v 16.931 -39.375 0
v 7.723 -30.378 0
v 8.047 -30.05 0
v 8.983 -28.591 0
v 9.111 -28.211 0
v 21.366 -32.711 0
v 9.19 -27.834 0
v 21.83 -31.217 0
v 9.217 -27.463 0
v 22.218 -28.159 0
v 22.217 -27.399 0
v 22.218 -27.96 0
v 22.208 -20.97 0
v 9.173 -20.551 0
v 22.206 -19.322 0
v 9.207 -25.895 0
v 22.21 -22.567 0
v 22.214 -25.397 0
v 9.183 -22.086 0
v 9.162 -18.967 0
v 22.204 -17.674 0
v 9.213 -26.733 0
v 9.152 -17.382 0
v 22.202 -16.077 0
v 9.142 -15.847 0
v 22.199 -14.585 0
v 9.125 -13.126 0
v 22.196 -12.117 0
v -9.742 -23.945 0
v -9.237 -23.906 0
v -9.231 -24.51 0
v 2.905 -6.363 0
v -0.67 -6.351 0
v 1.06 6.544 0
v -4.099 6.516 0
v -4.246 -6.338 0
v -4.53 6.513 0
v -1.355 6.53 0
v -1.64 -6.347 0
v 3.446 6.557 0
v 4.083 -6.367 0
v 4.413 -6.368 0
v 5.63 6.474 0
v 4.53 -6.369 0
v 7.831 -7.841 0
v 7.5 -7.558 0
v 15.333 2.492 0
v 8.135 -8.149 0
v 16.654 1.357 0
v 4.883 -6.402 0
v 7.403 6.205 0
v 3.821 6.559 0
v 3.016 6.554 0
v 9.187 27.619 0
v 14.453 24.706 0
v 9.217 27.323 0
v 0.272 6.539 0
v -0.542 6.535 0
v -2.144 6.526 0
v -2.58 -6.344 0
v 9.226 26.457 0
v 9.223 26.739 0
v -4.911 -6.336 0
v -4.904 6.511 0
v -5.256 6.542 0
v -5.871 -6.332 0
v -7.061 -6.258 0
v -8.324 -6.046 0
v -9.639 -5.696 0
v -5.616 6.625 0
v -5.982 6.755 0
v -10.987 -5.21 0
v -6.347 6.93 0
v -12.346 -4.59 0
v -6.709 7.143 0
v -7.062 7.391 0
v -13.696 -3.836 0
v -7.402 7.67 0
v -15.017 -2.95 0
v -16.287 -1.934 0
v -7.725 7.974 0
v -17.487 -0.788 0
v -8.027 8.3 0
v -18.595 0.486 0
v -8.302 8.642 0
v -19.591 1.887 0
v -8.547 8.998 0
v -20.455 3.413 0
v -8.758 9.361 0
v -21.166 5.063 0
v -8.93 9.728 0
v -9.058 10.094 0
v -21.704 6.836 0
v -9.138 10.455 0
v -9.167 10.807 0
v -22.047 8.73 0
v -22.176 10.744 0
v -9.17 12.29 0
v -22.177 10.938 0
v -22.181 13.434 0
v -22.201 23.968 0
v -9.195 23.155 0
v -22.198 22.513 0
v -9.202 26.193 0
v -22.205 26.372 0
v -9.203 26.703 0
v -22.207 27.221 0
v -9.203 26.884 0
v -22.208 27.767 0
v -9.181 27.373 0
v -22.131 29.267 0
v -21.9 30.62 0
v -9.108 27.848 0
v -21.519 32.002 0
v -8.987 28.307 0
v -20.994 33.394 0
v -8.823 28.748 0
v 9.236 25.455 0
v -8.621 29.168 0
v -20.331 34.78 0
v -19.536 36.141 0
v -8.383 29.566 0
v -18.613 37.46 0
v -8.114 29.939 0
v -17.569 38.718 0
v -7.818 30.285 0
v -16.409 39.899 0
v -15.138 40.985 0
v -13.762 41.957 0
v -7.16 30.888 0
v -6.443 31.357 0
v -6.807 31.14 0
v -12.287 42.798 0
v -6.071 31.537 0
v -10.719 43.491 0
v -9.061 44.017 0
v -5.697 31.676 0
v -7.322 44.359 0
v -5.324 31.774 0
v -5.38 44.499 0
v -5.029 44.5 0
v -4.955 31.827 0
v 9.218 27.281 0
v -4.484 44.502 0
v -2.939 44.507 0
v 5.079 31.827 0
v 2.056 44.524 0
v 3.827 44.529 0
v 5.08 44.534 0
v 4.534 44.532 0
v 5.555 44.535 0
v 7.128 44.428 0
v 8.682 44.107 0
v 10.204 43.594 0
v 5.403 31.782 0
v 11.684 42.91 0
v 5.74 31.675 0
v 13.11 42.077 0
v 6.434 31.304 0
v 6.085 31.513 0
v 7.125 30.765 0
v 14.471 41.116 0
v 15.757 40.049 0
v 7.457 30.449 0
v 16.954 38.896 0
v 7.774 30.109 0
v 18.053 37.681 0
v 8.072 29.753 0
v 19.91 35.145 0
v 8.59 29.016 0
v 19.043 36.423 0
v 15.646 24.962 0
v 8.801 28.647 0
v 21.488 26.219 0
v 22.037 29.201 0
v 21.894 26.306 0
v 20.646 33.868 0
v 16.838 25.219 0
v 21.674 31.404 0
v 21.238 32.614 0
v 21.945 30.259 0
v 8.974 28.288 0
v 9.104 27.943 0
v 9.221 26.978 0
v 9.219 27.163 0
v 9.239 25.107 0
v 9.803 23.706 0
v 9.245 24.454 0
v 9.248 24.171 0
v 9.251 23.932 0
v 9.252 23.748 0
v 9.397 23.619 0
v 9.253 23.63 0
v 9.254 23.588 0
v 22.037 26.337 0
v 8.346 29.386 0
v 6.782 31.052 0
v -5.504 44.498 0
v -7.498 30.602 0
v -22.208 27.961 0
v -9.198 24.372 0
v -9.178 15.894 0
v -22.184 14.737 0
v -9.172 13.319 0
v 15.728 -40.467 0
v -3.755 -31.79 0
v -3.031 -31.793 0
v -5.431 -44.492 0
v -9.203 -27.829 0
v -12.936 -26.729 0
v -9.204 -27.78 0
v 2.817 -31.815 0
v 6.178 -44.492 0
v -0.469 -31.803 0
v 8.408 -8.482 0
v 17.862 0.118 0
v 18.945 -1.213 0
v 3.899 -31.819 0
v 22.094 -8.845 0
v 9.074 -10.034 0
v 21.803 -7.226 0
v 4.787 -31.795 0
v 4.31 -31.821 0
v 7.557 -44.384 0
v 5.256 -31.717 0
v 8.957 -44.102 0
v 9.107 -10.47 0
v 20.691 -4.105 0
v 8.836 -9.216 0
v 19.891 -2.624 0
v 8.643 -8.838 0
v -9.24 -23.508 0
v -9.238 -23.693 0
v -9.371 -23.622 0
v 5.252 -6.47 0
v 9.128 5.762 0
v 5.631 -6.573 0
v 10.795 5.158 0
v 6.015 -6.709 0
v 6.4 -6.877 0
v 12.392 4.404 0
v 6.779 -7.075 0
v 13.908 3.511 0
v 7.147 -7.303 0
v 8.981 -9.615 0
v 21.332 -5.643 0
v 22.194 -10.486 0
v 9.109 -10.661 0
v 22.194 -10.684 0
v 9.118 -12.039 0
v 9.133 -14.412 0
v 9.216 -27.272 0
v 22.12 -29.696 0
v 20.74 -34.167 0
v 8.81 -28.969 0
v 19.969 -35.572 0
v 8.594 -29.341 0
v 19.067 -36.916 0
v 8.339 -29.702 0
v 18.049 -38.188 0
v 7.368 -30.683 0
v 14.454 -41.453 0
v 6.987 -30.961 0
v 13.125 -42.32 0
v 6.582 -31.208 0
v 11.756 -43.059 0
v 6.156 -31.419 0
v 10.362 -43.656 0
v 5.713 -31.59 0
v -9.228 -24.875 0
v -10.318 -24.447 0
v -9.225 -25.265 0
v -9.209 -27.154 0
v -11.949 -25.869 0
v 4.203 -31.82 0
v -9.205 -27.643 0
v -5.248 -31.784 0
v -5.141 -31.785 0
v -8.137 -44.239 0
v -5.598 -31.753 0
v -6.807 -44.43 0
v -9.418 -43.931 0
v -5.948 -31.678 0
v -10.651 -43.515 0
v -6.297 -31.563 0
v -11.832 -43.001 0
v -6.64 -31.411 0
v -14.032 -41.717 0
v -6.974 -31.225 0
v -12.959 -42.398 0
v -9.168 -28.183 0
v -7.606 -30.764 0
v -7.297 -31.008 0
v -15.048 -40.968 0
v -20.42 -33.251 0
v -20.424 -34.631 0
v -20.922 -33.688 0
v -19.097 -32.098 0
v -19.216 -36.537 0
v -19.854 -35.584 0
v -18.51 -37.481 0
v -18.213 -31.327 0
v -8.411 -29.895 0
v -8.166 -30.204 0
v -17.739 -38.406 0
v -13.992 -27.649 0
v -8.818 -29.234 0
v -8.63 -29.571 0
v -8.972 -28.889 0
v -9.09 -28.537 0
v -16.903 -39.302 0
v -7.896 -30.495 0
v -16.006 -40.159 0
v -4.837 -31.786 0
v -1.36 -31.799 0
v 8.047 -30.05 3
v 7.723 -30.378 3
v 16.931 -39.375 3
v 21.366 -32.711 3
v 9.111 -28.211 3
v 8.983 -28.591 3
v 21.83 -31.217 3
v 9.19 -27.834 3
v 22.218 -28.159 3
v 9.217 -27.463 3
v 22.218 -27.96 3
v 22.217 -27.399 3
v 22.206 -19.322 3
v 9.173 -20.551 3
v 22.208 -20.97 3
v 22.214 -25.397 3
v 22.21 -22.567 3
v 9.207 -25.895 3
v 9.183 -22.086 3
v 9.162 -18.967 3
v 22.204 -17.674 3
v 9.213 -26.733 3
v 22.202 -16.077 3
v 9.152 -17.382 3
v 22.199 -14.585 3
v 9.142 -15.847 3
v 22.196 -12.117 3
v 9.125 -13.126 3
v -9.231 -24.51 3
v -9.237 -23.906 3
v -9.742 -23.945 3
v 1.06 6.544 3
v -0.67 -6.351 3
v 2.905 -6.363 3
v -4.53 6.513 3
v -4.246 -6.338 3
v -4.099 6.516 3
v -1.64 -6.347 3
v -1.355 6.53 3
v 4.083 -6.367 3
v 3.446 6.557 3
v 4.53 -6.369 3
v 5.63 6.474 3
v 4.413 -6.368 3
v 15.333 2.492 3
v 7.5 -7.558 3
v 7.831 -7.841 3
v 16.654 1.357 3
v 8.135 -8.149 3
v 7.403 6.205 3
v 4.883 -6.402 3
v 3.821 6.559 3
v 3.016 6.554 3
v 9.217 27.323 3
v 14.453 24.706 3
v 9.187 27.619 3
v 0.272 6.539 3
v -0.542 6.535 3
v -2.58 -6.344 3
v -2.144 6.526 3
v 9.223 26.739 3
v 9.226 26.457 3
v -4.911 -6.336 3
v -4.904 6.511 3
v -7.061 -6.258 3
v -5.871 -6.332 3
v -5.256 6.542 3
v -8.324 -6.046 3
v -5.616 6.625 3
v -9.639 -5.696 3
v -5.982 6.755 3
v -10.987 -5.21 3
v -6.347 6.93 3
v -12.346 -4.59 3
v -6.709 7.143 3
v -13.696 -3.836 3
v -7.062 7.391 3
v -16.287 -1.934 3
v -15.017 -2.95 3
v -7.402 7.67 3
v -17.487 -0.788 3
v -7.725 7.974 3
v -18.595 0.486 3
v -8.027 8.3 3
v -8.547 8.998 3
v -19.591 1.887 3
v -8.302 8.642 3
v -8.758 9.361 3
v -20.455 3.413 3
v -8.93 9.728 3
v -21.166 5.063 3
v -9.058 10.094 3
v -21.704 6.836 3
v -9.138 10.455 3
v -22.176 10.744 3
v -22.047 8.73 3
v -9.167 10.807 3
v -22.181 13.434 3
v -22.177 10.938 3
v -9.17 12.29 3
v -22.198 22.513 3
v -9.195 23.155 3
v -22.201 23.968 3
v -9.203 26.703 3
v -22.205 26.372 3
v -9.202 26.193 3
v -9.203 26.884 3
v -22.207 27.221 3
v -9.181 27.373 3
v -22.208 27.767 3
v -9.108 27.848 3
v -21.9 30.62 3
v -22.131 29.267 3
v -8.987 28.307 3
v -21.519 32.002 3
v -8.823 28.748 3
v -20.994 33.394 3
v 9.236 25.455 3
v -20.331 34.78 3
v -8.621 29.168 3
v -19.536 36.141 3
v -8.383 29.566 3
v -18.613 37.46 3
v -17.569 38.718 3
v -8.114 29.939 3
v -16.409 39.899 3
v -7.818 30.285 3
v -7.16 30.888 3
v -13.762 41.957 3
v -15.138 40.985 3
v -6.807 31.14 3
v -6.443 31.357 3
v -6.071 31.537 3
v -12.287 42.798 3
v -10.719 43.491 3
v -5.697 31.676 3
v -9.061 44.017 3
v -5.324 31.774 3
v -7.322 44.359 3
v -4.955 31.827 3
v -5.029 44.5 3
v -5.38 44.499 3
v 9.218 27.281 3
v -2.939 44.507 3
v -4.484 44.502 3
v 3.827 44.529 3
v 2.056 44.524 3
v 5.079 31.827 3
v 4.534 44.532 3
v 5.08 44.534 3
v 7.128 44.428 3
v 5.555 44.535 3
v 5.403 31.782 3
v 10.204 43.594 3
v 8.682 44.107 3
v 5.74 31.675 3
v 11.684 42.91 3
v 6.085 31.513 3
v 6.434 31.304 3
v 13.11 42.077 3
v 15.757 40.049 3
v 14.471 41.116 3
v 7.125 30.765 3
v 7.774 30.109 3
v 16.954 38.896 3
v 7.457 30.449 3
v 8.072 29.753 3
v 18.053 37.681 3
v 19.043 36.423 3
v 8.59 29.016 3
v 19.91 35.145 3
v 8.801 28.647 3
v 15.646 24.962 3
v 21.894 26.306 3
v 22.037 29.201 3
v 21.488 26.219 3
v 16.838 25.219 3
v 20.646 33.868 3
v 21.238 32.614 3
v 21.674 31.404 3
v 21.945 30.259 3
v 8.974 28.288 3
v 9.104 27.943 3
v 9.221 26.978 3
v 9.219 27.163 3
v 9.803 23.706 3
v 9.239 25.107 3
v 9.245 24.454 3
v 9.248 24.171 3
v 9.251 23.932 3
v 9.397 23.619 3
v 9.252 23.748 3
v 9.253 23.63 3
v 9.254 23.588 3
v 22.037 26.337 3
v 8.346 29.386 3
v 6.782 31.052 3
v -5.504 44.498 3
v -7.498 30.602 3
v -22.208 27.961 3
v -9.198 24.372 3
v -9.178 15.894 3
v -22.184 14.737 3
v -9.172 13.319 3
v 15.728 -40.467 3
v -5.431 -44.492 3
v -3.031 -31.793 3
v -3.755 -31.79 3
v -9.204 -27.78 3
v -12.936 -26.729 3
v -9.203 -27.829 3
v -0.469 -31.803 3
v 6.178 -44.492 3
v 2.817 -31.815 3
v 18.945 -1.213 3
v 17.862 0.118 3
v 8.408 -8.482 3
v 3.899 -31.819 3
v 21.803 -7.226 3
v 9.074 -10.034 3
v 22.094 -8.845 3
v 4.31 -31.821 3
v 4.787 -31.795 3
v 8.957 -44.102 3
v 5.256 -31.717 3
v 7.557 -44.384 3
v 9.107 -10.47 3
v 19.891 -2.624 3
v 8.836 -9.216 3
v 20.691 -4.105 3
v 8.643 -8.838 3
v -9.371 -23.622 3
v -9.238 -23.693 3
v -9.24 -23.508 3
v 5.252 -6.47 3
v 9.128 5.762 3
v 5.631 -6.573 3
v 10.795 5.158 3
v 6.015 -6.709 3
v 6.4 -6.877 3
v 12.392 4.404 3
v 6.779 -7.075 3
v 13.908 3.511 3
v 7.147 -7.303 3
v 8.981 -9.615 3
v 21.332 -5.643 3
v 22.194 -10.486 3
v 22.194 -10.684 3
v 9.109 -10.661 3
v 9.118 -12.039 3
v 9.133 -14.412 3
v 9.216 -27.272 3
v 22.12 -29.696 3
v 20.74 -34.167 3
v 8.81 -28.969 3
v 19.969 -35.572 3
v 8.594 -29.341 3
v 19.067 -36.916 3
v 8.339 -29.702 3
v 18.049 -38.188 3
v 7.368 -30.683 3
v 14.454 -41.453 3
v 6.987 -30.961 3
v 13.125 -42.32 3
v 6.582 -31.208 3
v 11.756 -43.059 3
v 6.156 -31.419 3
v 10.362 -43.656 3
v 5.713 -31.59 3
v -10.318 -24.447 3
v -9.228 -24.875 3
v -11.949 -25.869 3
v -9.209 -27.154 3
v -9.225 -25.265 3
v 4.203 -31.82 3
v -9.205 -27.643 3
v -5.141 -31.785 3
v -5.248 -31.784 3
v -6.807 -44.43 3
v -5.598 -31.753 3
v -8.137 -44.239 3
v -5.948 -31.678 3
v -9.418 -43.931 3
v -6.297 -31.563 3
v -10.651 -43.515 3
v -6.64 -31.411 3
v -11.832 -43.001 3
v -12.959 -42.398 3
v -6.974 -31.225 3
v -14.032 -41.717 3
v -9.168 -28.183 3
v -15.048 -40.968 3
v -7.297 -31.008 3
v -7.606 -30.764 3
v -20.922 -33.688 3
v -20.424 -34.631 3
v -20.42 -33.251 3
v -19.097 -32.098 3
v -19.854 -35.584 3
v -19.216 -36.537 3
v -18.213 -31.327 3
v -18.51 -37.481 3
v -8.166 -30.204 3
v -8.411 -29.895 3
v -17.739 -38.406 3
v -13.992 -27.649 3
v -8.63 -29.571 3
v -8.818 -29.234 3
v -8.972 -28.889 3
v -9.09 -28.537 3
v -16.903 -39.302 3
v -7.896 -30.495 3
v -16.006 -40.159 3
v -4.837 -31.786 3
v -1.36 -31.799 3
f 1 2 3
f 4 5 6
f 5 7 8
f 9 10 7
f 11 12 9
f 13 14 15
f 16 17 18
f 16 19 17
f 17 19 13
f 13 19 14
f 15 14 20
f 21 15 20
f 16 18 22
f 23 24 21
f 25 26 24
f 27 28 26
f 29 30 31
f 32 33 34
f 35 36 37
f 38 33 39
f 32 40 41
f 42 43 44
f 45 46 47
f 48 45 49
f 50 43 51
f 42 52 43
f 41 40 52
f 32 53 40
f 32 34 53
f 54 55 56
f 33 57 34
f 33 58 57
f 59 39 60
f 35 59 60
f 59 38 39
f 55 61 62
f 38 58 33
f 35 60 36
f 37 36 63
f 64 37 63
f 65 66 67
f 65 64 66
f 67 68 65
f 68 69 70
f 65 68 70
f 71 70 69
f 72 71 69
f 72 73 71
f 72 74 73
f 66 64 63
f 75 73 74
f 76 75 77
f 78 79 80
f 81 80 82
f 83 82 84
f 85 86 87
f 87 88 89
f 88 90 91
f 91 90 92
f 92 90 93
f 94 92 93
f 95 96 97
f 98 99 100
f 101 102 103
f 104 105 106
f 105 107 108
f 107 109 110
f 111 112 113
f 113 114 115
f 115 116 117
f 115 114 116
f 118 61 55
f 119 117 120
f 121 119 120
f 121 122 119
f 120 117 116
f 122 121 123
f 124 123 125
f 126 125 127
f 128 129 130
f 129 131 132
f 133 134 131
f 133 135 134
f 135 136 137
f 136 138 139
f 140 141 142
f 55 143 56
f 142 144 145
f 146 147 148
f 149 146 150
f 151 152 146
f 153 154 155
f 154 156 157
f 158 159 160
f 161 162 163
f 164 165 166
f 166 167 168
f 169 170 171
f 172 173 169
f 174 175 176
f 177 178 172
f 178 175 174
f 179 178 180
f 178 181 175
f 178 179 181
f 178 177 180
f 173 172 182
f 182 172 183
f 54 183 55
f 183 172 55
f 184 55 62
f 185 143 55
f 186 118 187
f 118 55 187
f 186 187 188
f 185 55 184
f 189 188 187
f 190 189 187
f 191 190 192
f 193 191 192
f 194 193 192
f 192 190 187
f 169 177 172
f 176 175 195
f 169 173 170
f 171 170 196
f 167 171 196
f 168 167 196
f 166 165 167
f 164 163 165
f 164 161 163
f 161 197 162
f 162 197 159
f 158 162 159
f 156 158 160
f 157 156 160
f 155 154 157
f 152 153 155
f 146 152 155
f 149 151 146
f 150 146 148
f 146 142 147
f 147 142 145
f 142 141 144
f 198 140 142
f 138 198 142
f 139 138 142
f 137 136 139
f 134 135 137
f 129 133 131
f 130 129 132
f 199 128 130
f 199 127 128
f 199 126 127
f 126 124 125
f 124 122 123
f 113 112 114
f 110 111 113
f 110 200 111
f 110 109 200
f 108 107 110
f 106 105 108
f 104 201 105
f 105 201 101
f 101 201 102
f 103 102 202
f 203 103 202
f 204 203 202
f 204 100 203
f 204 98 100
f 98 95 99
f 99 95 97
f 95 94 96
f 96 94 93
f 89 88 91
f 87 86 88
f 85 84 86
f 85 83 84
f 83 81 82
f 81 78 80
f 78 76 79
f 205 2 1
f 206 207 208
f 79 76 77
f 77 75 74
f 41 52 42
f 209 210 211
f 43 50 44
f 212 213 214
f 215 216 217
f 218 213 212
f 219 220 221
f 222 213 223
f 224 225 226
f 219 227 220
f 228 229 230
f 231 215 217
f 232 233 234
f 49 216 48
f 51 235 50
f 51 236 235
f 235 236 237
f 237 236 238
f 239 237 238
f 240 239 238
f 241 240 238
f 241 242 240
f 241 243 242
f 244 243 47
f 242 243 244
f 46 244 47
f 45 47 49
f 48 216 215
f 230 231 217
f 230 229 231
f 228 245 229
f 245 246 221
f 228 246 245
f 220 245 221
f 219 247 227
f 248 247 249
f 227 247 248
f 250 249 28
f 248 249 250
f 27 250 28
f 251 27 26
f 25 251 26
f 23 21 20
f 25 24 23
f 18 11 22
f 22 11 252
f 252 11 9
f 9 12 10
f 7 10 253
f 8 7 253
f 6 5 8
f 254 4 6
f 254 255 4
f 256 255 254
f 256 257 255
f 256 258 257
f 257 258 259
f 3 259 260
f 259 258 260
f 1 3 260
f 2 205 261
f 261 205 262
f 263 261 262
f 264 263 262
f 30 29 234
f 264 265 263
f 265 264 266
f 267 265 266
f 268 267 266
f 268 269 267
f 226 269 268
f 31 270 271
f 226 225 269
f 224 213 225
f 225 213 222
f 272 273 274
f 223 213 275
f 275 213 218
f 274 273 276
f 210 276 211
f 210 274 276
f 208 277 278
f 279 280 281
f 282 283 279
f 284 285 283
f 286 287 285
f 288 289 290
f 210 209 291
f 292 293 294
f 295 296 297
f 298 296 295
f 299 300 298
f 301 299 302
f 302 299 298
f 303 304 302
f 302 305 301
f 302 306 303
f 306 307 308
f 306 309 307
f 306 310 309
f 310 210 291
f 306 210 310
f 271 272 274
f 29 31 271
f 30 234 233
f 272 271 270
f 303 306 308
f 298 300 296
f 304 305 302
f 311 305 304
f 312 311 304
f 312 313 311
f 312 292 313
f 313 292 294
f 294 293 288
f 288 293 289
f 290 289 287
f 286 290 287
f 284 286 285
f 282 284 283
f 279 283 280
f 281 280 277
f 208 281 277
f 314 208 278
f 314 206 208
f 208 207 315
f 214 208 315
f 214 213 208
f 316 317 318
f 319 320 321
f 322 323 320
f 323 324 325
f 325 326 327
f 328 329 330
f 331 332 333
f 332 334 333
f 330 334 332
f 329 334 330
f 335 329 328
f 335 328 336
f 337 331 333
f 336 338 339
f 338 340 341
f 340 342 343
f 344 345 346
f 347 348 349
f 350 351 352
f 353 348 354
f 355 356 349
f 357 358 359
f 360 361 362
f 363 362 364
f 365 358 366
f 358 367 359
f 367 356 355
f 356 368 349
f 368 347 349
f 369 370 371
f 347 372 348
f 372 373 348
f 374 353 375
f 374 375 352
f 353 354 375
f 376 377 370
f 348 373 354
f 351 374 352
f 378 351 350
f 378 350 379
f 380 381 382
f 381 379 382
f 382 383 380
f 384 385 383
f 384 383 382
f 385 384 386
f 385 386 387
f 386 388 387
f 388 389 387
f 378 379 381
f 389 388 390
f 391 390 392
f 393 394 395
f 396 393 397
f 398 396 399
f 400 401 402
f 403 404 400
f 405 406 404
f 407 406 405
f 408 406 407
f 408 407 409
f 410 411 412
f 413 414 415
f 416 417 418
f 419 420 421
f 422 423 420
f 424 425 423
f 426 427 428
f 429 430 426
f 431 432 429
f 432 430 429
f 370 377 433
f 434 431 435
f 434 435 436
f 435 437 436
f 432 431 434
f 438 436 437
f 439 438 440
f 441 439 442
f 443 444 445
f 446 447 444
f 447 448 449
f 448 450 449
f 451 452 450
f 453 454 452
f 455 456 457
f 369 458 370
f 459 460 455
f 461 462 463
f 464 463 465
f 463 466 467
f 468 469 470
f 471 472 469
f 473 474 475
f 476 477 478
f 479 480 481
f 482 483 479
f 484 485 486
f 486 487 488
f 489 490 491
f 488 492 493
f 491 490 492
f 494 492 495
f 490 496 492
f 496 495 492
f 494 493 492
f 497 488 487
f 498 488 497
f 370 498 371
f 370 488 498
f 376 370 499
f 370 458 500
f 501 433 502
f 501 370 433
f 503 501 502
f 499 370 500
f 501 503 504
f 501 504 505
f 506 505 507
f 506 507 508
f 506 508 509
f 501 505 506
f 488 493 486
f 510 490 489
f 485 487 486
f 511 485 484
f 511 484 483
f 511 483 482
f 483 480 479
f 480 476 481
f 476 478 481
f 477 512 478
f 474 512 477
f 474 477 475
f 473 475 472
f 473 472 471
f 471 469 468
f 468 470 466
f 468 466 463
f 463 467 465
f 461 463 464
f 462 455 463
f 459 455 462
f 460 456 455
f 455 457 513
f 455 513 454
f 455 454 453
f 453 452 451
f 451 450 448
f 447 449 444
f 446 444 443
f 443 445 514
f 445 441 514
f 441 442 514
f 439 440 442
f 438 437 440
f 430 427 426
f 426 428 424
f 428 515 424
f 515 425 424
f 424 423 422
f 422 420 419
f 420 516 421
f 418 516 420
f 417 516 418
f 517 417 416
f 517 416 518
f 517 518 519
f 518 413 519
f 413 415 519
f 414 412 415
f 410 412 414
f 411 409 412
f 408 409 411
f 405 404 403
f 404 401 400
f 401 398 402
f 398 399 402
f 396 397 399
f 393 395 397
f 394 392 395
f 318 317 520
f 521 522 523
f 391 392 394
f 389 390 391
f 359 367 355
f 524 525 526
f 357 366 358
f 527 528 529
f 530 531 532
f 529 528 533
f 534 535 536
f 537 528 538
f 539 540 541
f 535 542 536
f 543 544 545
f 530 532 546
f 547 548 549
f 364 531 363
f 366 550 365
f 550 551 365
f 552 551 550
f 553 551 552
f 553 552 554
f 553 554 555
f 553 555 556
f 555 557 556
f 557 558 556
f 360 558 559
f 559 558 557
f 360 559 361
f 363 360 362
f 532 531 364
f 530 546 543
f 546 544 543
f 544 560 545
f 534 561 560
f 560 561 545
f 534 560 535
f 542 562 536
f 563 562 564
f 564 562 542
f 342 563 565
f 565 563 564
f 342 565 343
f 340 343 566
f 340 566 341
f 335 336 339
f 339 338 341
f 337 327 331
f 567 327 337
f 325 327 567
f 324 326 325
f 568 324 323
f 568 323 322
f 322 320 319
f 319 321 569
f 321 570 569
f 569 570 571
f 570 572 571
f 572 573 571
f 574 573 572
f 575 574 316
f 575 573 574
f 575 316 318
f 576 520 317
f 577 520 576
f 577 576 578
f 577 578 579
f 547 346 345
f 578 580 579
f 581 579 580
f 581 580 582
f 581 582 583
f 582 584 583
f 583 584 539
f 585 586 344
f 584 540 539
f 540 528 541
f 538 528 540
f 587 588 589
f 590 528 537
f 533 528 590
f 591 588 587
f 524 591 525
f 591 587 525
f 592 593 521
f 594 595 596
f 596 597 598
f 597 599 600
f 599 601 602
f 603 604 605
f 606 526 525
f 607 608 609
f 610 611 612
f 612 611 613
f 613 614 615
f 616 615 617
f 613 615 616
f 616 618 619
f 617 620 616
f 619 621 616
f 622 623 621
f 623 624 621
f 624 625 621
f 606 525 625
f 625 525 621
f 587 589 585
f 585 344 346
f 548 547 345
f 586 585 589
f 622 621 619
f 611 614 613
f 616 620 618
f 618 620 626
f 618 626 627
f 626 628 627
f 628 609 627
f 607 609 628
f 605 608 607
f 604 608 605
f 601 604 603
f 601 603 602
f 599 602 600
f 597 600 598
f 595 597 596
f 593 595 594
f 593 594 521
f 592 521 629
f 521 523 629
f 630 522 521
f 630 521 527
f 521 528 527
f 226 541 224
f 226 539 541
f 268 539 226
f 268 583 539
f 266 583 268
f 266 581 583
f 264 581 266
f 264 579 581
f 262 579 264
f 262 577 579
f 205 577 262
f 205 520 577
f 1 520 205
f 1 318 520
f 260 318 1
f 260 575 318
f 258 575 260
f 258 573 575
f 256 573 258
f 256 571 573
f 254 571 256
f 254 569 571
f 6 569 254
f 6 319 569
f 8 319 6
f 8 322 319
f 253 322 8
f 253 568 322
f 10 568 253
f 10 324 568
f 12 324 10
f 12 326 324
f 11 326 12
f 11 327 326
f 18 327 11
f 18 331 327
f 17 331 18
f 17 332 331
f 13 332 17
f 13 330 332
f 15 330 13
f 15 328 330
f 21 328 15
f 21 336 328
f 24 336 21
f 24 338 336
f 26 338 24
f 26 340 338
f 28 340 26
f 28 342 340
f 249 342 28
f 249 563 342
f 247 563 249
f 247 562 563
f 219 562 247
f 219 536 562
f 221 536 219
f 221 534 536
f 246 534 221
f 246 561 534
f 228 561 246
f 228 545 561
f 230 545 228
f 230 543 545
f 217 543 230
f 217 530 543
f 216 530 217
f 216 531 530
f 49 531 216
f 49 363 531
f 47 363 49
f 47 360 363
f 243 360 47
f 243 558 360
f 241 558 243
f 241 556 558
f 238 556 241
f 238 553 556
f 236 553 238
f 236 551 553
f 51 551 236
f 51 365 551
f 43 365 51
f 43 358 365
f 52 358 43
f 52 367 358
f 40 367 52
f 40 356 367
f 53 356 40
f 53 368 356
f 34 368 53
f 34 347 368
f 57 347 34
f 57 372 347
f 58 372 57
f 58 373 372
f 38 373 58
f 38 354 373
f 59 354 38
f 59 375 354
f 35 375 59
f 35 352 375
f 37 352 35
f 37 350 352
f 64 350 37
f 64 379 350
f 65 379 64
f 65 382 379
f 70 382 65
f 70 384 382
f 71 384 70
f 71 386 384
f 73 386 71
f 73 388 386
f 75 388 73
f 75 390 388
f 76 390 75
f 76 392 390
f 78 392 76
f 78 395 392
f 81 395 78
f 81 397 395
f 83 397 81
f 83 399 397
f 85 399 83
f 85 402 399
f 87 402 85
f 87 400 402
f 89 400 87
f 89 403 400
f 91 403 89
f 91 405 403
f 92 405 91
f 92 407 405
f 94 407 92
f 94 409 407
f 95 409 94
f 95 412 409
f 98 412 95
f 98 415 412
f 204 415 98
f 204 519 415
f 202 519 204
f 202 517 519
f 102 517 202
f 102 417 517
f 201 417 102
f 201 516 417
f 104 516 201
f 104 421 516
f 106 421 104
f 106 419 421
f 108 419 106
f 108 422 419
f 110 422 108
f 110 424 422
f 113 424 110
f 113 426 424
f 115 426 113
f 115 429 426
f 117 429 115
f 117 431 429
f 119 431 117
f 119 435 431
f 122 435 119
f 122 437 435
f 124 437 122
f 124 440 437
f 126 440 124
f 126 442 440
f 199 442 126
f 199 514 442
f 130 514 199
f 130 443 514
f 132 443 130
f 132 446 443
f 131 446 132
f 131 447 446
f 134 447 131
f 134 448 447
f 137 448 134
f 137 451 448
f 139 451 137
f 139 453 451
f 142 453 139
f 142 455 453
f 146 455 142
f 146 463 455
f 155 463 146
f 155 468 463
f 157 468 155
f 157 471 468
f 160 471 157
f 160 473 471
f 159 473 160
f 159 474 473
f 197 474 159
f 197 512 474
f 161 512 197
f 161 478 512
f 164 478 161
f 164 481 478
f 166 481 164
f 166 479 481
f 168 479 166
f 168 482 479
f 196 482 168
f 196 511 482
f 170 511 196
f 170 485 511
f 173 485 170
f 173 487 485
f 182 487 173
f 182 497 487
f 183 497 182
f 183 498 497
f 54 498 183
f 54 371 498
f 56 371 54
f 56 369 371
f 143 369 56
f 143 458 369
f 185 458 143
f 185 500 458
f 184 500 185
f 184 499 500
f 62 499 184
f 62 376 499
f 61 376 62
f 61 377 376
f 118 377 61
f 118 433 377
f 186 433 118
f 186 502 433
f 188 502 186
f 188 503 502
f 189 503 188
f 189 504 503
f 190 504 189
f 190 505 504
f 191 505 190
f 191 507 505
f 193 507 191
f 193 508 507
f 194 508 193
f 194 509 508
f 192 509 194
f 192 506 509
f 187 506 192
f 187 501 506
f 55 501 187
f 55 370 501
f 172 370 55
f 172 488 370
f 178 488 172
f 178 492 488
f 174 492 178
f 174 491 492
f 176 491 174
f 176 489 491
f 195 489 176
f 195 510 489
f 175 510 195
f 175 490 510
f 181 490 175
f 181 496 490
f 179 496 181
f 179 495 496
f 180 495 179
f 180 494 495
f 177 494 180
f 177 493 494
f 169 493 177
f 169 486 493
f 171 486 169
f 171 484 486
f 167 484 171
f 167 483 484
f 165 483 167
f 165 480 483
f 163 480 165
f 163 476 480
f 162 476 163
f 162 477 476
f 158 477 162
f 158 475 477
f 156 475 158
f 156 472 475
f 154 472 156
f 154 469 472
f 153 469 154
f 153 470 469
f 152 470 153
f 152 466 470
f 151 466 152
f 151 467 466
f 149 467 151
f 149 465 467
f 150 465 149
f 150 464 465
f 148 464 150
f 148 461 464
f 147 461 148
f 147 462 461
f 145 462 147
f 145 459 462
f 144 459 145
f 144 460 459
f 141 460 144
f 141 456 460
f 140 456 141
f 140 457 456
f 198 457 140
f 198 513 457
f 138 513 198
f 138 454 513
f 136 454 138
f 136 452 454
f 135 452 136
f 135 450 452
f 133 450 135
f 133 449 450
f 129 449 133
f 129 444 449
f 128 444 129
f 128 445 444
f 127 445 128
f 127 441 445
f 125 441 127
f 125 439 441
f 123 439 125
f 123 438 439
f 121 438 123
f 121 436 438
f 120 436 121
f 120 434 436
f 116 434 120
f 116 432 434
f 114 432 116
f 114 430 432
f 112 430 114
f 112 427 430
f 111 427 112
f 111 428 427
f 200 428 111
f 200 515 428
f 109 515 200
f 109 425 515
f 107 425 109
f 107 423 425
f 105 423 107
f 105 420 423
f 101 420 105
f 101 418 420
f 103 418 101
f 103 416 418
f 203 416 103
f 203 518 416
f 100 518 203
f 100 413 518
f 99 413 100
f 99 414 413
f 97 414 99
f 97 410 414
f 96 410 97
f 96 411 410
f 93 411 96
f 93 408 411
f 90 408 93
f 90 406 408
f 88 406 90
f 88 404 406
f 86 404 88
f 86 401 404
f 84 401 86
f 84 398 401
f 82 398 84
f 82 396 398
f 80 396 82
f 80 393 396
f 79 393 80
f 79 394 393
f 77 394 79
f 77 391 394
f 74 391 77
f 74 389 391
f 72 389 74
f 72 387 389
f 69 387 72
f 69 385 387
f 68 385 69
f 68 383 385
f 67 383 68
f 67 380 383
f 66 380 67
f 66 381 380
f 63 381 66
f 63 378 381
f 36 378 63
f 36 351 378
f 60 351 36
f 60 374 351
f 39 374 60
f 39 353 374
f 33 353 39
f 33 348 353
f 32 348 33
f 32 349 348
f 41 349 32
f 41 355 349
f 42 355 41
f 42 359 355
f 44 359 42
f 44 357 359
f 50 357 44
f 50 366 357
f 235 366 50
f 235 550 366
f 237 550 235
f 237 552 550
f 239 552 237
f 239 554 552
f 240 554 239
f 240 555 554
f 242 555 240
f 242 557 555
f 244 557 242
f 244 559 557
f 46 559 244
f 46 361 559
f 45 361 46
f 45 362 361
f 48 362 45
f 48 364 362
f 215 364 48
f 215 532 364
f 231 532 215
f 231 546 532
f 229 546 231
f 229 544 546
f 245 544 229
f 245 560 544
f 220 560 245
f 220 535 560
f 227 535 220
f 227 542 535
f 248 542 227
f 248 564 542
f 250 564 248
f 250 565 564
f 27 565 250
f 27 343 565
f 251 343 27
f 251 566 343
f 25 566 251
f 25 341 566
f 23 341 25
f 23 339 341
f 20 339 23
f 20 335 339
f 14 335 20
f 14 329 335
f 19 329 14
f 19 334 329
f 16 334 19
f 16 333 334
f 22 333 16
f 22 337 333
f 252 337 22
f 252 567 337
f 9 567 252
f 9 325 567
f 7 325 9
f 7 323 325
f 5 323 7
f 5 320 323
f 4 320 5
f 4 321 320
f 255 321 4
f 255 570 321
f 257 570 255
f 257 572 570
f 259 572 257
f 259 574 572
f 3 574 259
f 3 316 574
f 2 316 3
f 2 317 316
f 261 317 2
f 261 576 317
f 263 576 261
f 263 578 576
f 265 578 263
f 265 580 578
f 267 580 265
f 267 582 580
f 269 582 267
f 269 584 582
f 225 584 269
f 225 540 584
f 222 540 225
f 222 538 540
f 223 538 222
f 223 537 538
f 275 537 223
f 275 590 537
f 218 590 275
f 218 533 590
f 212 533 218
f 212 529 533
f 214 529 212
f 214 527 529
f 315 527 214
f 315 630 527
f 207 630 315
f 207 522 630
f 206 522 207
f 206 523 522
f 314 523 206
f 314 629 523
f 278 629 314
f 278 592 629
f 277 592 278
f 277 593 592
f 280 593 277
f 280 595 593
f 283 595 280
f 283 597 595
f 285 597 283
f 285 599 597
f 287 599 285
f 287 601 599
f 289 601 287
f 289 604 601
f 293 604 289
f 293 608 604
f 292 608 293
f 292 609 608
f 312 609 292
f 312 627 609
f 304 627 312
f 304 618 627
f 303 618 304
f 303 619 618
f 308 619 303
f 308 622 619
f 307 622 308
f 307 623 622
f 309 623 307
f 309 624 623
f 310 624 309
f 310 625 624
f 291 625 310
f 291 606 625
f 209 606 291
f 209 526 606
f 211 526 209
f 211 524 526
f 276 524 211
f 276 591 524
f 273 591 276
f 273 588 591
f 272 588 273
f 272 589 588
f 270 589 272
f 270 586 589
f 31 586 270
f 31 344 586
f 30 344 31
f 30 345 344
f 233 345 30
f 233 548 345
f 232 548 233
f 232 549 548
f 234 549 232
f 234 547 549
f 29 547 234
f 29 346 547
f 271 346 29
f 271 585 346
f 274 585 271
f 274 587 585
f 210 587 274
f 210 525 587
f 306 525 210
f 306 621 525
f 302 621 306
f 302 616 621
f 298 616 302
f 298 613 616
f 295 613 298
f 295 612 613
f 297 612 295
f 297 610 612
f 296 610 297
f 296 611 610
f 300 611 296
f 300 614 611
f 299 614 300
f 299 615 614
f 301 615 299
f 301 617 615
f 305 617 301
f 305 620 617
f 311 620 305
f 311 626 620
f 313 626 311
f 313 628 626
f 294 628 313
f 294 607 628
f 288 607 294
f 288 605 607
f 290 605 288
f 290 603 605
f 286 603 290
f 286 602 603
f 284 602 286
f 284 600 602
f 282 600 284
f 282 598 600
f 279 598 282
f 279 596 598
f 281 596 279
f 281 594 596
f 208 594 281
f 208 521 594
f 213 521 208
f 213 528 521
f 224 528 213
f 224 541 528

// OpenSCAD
// Generated from 交通部公路局（原交通部公路總局）「新式號牌使用之英文字、數字字體」author trace
fudge = 0.1;

module glyph_2012_S(h = 3) {
  difference() {
    linear_extrude(height = h)
      polygon(points = [[-5.5045, 44.4985], [-7.3216, 44.3586], [-9.0615, 44.0167], [-10.7186, 43.4907], [-12.2874, 42.7982], [-13.7624, 41.957], [-15.138, 40.9848], [-16.4087, 39.8994], [-17.5689, 38.7185], [-18.6131, 37.4598], [-19.5357, 36.1411], [-20.3313, 34.7801], [-20.9942, 33.3944], [-21.5189, 32.002], [-21.8998, 30.6204], [-22.1315, 29.2674], [-22.2084, 27.9608], [-22.2081, 27.7674], [-22.207, 27.221], [-22.2054, 26.3719], [-22.2034, 25.2707], [-22.201, 23.9677], [-22.1982, 22.5133], [-22.1953, 20.9581], [-22.1923, 19.3525], [-22.1893, 17.7468], [-22.1864, 16.1916], [-22.1837, 14.7373], [-22.1813, 13.4343], [-22.1792, 12.333], [-22.1776, 11.4839], [-22.1766, 10.9375], [-22.1762, 10.7442], [-22.0473, 8.7298], [-21.7038, 6.8356], [-21.1663, 5.0627], [-20.4552, 3.4126], [-19.5913, 1.8866], [-18.5949, 0.486], [-17.4867, -0.7879], [-16.2871, -1.9338], [-15.0169, -2.9503], [-13.6965, -3.8362], [-12.3464, -4.5899], [-10.9872, -5.2104], [-9.6395, -5.6962], [-8.3238, -6.046], [-7.0607, -6.2584], [-5.8708, -6.3322], [-5.7539, -6.3326], [-5.4239, -6.3338], [-4.9109, -6.3356], [-4.2457, -6.3379], [-3.4585, -6.3407], [-2.58, -6.3438], [-1.6405, -6.3471], [-0.6705, -6.3506], [0.2995, -6.354], [1.239, -6.3573], [2.1175, -6.3604], [2.9047, -6.3632], [3.57, -6.3655], [4.0829, -6.3673], [4.413, -6.3685], [4.5298, -6.3689], [4.8828, -6.4019], [5.2516, -6.4705], [5.6309, -6.5733], [6.0154, -6.7091], [6.3998, -6.8768], [6.7789, -7.0751], [7.1472, -7.3027], [7.4996, -7.5585], [7.8306, -7.8411], [8.1351, -8.1495], [8.4078, -8.4824], [8.6432, -8.8384], [8.8362, -9.2165], [8.9815, -9.6154], [9.0737, -10.0338], [9.1075, -10.4705], [9.1087, -10.6614], [9.1122, -11.2007], [9.1176, -12.0387], [9.1246, -13.1256], [9.133, -14.4116], [9.1422, -15.847], [9.1522, -17.382], [9.1624, -18.9667], [9.1727, -20.5515], [9.1826, -22.0864], [9.1919, -23.5218], [9.2002, -24.8079], [9.2072, -25.8948], [9.2126, -26.7328], [9.2161, -27.2721], [9.2173, -27.4629], [9.1901, -27.8338], [9.111, -28.2112], [8.9832, -28.5911], [8.8099, -28.9691], [8.594, -29.341], [8.3388, -29.7025], [8.0474, -30.0496], [7.7229, -30.3779], [7.3684, -30.6832], [6.9871, -30.9612], [6.582, -31.2078], [6.1564, -31.4187], [5.7132, -31.5897], [5.2557, -31.7166], [4.7869, -31.795], [4.31, -31.8209], [4.2027, -31.8205], [3.8993, -31.8193], [3.428, -31.8175], [2.8166, -31.8152], [2.0932, -31.8124], [1.2858, -31.8093], [0.4223, -31.806], [-0.4691, -31.8026], [-1.3605, -31.7991], [-2.2239, -31.7958], [-3.0313, -31.7927], [-3.7547, -31.7899], [-4.3661, -31.7876], [-4.8375, -31.7858], [-5.1408, -31.7846], [-5.2482, -31.7842], [-5.5978, -31.7526], [-5.9483, -31.6777], [-6.2967, -31.5628], [-6.6397, -31.4108], [-6.9744, -31.2248], [-7.2974, -31.0081], [-7.6058, -30.7637], [-7.8963, -30.4946], [-8.1659, -30.2041], [-8.4114, -29.8951], [-8.6297, -29.5709], [-8.8177, -29.2345], [-8.9721, -28.889], [-9.09, -28.5375], [-9.1681, -28.1832], [-9.2033, -27.8291], [-9.2037, -27.7805], [-9.2049, -27.6434], [-9.2067, -27.4303], [-9.209, -27.1539], [-9.2118, -26.8268], [-9.2149, -26.4618], [-9.2182, -26.0714], [-9.2216, -25.6684], [-9.225, -25.2654], [-9.2284, -24.875], [-9.2314, -24.51], [-9.2342, -24.1829], [-9.2366, -23.9065], [-9.2384, -23.6934], [-9.2395, -23.5563], [-9.2399, -23.5077], [-9.3711, -23.6221], [-9.7419, -23.9452], [-10.318, -24.4473], [-11.0653, -25.0985], [-11.9495, -25.869], [-12.9363, -26.729], [-13.9916, -27.6486], [-15.0811, -28.5981], [-16.1706, -29.5476], [-17.2259, -30.4673], [-18.2127, -31.3273], [-19.0969, -32.0978], [-19.8441, -32.749], [-20.4202, -33.2511], [-20.791, -33.5742], [-20.9222, -33.6885], [-20.4238, -34.6309], [-19.8545, -35.5838], [-19.216, -36.5372], [-18.5101, -37.4814], [-17.7386, -38.4065], [-16.9033, -39.3024], [-16.0059, -40.1595], [-15.0483, -40.9678], [-14.0322, -41.7174], [-12.9594, -42.3985], [-11.8317, -43.0011], [-10.6508, -43.5154], [-9.4185, -43.9315], [-8.1367, -44.2395], [-6.807, -44.4296], [-5.4313, -44.4919], [-5.3009, -44.4919], [-4.9325, -44.4919], [-4.36, -44.4919], [-3.6174, -44.4919], [-2.7388, -44.4919], [-1.7581, -44.4919], [-0.7095, -44.4919], [0.3732, -44.4919], [1.4559, -44.4919], [2.5046, -44.4919], [3.4852, -44.4919], [4.3638, -44.4919], [5.1064, -44.4919], [5.6789, -44.4919], [6.0474, -44.4919], [6.1777, -44.4919], [7.5575, -44.3843], [8.9572, -44.102], [10.3618, -43.6563], [11.7562, -43.0587], [13.1255, -42.3205], [14.4545, -41.4529], [15.7282, -40.4674], [16.9315, -39.3752], [18.0494, -38.1877], [19.0668, -36.9162], [19.9687, -35.5721], [20.74, -34.1667], [21.3656, -32.7113], [21.8305, -31.2173], [22.1197, -29.696], [22.218, -28.1587], [22.2177, -27.9602], [22.217, -27.3993], [22.2158, -26.5277], [22.2142, -25.3973], [22.2124, -24.0597], [22.2104, -22.5668], [22.2082, -20.9704], [22.206, -19.3221], [22.2037, -17.6739], [22.2016, -16.0775], [22.1995, -14.5846], [22.1977, -13.247], [22.1962, -12.1166], [22.195, -11.245], [22.1942, -10.6841], [22.1939, -10.4856], [22.0944, -8.8447], [21.8033, -7.2265], [21.3317, -5.6426], [20.6907, -4.1046], [19.8914, -2.6241], [18.9449, -1.2126], [17.8622, 0.1183], [16.6545, 1.357], [15.3329, 2.4919], [13.9083, 3.5115], [12.3919, 4.4042], [10.7949, 5.1583], [9.1282, 5.7624], [7.403, 6.2049], [5.6303, 6.4741], [3.8213, 6.5586], [3.7233, 6.5581], [3.4463, 6.5566], [3.016, 6.5542], [2.4579, 6.5512], [1.7975, 6.5476], [1.0604, 6.5436], [0.2722, 6.5394], [-0.5416, 6.5349], [-1.3554, 6.5305], [-2.1436, 6.5263], [-2.8807, 6.5223], [-3.5411, 6.5187], [-4.0992, 6.5157], [-4.5296, 6.5133], [-4.8065, 6.5118], [-4.9045, 6.5113], [-5.256, 6.5417], [-5.6165, 6.6246], [-5.9818, 6.7554], [-6.3473, 6.9298], [-6.7087, 7.1433], [-7.0618, 7.3914], [-7.402, 7.6699], [-7.7251, 7.9741], [-8.0266, 8.2998], [-8.3021, 8.6424], [-8.5474, 8.9976], [-8.7581, 9.3609], [-8.9297, 9.7279], [-9.0579, 10.0942], [-9.1384, 10.4553], [-9.1667, 10.8067], [-9.1671, 10.9873], [-9.1683, 11.4975], [-9.1701, 12.2904], [-9.1724, 13.3188], [-9.1752, 14.5355], [-9.1783, 15.8936], [-9.1816, 17.3458], [-9.185, 18.8452], [-9.1884, 20.3445], [-9.1917, 21.7968], [-9.1948, 23.1548], [-9.1976, 24.3716], [-9.1999, 25.4], [-9.2017, 26.1928], [-9.2029, 26.7031], [-9.2033, 26.8836], [-9.1811, 27.373], [-9.1076, 27.8483], [-8.9871, 28.3074], [-8.8234, 28.7482], [-8.6206, 29.1685], [-8.3828, 29.5662], [-8.1138, 29.9392], [-7.8177, 30.2852], [-7.4985, 30.6022], [-7.1603, 30.888], [-6.8071, 31.1404], [-6.4427, 31.3574], [-6.0714, 31.5367], [-5.697, 31.6763], [-5.3236, 31.7739], [-4.9552, 31.8275], [-4.8425, 31.8275], [-4.5241, 31.8275], [-4.0292, 31.8275], [-3.3874, 31.8275], [-2.6279, 31.8275], [-1.7803, 31.8275], [-0.8739, 31.8275], [0.0619, 31.8275], [0.9978, 31.8275], [1.9042, 31.8275], [2.7518, 31.8275], [3.5112, 31.8275], [4.1531, 31.8275], [4.6479, 31.8275], [4.9664, 31.8275], [5.0791, 31.8275], [5.4029, 31.7816], [5.7398, 31.6748], [6.0851, 31.5135], [6.4341, 31.3038], [6.7822, 31.0523], [7.1247, 30.7651], [7.4569, 30.4486], [7.7743, 30.1091], [8.072, 29.7529], [8.3456, 29.3863], [8.5903, 29.0157], [8.8014, 28.6474], [8.9743, 28.2877], [9.1044, 27.9428], [9.187, 27.6192], [9.2173, 27.3231], [9.2178, 27.2811], [9.2189, 27.1626], [9.2207, 26.9784], [9.2231, 26.7394], [9.2258, 26.4567], [9.2289, 26.1412], [9.2322, 25.8037], [9.2356, 25.4554], [9.2391, 25.107], [9.2424, 24.7696], [9.2455, 24.454], [9.2482, 24.1713], [9.2506, 23.9324], [9.2524, 23.7482], [9.2535, 23.6296], [9.254, 23.5877], [9.3975, 23.6186], [9.8033, 23.7058], [10.4337, 23.8414], [11.2514, 24.0173], [12.2189, 24.2254], [13.2988, 24.4577], [14.4535, 24.7061], [15.6457, 24.9625], [16.8379, 25.219], [17.9927, 25.4674], [19.0726, 25.6997], [20.0401, 25.9078], [20.8578, 26.0837], [21.4882, 26.2193], [21.8939, 26.3065], [22.0375, 26.3374], [22.0375, 26.3696], [22.0375, 26.4605], [22.0375, 26.6017], [22.0375, 26.7848], [22.0375, 27.0015], [22.0375, 27.2434], [22.0375, 27.5021], [22.0375, 27.7691], [22.0375, 28.0361], [22.0375, 28.2948], [22.0375, 28.5366], [22.0375, 28.7534], [22.0375, 28.9365], [22.0375, 29.0777], [22.0375, 29.1686], [22.0375, 29.2007], [21.9447, 30.2587], [21.6743, 31.4036], [21.2377, 32.614], [20.646, 33.8684], [19.9105, 35.1453], [19.0426, 36.4233], [18.0535, 37.6808], [16.9544, 38.8964], [15.7566, 40.0486], [14.4714, 41.116], [13.11, 42.077], [11.6838, 42.9102], [10.2039, 43.5941], [8.6817, 44.1072], [7.1283, 44.4281], [5.5552, 44.5352], [5.431, 44.5348], [5.08, 44.5337], [4.5345, 44.5318], [3.8271, 44.5295], [2.9901, 44.5267], [2.0558, 44.5236], [1.0568, 44.5203], [0.0253, 44.5169], [-1.0061, 44.5135], [-2.0052, 44.5102], [-2.9394, 44.5071], [-3.7765, 44.5043], [-4.4839, 44.5019], [-5.0293, 44.5001], [-5.3803, 44.499]]);
  }
}

glyph_2012_S();
